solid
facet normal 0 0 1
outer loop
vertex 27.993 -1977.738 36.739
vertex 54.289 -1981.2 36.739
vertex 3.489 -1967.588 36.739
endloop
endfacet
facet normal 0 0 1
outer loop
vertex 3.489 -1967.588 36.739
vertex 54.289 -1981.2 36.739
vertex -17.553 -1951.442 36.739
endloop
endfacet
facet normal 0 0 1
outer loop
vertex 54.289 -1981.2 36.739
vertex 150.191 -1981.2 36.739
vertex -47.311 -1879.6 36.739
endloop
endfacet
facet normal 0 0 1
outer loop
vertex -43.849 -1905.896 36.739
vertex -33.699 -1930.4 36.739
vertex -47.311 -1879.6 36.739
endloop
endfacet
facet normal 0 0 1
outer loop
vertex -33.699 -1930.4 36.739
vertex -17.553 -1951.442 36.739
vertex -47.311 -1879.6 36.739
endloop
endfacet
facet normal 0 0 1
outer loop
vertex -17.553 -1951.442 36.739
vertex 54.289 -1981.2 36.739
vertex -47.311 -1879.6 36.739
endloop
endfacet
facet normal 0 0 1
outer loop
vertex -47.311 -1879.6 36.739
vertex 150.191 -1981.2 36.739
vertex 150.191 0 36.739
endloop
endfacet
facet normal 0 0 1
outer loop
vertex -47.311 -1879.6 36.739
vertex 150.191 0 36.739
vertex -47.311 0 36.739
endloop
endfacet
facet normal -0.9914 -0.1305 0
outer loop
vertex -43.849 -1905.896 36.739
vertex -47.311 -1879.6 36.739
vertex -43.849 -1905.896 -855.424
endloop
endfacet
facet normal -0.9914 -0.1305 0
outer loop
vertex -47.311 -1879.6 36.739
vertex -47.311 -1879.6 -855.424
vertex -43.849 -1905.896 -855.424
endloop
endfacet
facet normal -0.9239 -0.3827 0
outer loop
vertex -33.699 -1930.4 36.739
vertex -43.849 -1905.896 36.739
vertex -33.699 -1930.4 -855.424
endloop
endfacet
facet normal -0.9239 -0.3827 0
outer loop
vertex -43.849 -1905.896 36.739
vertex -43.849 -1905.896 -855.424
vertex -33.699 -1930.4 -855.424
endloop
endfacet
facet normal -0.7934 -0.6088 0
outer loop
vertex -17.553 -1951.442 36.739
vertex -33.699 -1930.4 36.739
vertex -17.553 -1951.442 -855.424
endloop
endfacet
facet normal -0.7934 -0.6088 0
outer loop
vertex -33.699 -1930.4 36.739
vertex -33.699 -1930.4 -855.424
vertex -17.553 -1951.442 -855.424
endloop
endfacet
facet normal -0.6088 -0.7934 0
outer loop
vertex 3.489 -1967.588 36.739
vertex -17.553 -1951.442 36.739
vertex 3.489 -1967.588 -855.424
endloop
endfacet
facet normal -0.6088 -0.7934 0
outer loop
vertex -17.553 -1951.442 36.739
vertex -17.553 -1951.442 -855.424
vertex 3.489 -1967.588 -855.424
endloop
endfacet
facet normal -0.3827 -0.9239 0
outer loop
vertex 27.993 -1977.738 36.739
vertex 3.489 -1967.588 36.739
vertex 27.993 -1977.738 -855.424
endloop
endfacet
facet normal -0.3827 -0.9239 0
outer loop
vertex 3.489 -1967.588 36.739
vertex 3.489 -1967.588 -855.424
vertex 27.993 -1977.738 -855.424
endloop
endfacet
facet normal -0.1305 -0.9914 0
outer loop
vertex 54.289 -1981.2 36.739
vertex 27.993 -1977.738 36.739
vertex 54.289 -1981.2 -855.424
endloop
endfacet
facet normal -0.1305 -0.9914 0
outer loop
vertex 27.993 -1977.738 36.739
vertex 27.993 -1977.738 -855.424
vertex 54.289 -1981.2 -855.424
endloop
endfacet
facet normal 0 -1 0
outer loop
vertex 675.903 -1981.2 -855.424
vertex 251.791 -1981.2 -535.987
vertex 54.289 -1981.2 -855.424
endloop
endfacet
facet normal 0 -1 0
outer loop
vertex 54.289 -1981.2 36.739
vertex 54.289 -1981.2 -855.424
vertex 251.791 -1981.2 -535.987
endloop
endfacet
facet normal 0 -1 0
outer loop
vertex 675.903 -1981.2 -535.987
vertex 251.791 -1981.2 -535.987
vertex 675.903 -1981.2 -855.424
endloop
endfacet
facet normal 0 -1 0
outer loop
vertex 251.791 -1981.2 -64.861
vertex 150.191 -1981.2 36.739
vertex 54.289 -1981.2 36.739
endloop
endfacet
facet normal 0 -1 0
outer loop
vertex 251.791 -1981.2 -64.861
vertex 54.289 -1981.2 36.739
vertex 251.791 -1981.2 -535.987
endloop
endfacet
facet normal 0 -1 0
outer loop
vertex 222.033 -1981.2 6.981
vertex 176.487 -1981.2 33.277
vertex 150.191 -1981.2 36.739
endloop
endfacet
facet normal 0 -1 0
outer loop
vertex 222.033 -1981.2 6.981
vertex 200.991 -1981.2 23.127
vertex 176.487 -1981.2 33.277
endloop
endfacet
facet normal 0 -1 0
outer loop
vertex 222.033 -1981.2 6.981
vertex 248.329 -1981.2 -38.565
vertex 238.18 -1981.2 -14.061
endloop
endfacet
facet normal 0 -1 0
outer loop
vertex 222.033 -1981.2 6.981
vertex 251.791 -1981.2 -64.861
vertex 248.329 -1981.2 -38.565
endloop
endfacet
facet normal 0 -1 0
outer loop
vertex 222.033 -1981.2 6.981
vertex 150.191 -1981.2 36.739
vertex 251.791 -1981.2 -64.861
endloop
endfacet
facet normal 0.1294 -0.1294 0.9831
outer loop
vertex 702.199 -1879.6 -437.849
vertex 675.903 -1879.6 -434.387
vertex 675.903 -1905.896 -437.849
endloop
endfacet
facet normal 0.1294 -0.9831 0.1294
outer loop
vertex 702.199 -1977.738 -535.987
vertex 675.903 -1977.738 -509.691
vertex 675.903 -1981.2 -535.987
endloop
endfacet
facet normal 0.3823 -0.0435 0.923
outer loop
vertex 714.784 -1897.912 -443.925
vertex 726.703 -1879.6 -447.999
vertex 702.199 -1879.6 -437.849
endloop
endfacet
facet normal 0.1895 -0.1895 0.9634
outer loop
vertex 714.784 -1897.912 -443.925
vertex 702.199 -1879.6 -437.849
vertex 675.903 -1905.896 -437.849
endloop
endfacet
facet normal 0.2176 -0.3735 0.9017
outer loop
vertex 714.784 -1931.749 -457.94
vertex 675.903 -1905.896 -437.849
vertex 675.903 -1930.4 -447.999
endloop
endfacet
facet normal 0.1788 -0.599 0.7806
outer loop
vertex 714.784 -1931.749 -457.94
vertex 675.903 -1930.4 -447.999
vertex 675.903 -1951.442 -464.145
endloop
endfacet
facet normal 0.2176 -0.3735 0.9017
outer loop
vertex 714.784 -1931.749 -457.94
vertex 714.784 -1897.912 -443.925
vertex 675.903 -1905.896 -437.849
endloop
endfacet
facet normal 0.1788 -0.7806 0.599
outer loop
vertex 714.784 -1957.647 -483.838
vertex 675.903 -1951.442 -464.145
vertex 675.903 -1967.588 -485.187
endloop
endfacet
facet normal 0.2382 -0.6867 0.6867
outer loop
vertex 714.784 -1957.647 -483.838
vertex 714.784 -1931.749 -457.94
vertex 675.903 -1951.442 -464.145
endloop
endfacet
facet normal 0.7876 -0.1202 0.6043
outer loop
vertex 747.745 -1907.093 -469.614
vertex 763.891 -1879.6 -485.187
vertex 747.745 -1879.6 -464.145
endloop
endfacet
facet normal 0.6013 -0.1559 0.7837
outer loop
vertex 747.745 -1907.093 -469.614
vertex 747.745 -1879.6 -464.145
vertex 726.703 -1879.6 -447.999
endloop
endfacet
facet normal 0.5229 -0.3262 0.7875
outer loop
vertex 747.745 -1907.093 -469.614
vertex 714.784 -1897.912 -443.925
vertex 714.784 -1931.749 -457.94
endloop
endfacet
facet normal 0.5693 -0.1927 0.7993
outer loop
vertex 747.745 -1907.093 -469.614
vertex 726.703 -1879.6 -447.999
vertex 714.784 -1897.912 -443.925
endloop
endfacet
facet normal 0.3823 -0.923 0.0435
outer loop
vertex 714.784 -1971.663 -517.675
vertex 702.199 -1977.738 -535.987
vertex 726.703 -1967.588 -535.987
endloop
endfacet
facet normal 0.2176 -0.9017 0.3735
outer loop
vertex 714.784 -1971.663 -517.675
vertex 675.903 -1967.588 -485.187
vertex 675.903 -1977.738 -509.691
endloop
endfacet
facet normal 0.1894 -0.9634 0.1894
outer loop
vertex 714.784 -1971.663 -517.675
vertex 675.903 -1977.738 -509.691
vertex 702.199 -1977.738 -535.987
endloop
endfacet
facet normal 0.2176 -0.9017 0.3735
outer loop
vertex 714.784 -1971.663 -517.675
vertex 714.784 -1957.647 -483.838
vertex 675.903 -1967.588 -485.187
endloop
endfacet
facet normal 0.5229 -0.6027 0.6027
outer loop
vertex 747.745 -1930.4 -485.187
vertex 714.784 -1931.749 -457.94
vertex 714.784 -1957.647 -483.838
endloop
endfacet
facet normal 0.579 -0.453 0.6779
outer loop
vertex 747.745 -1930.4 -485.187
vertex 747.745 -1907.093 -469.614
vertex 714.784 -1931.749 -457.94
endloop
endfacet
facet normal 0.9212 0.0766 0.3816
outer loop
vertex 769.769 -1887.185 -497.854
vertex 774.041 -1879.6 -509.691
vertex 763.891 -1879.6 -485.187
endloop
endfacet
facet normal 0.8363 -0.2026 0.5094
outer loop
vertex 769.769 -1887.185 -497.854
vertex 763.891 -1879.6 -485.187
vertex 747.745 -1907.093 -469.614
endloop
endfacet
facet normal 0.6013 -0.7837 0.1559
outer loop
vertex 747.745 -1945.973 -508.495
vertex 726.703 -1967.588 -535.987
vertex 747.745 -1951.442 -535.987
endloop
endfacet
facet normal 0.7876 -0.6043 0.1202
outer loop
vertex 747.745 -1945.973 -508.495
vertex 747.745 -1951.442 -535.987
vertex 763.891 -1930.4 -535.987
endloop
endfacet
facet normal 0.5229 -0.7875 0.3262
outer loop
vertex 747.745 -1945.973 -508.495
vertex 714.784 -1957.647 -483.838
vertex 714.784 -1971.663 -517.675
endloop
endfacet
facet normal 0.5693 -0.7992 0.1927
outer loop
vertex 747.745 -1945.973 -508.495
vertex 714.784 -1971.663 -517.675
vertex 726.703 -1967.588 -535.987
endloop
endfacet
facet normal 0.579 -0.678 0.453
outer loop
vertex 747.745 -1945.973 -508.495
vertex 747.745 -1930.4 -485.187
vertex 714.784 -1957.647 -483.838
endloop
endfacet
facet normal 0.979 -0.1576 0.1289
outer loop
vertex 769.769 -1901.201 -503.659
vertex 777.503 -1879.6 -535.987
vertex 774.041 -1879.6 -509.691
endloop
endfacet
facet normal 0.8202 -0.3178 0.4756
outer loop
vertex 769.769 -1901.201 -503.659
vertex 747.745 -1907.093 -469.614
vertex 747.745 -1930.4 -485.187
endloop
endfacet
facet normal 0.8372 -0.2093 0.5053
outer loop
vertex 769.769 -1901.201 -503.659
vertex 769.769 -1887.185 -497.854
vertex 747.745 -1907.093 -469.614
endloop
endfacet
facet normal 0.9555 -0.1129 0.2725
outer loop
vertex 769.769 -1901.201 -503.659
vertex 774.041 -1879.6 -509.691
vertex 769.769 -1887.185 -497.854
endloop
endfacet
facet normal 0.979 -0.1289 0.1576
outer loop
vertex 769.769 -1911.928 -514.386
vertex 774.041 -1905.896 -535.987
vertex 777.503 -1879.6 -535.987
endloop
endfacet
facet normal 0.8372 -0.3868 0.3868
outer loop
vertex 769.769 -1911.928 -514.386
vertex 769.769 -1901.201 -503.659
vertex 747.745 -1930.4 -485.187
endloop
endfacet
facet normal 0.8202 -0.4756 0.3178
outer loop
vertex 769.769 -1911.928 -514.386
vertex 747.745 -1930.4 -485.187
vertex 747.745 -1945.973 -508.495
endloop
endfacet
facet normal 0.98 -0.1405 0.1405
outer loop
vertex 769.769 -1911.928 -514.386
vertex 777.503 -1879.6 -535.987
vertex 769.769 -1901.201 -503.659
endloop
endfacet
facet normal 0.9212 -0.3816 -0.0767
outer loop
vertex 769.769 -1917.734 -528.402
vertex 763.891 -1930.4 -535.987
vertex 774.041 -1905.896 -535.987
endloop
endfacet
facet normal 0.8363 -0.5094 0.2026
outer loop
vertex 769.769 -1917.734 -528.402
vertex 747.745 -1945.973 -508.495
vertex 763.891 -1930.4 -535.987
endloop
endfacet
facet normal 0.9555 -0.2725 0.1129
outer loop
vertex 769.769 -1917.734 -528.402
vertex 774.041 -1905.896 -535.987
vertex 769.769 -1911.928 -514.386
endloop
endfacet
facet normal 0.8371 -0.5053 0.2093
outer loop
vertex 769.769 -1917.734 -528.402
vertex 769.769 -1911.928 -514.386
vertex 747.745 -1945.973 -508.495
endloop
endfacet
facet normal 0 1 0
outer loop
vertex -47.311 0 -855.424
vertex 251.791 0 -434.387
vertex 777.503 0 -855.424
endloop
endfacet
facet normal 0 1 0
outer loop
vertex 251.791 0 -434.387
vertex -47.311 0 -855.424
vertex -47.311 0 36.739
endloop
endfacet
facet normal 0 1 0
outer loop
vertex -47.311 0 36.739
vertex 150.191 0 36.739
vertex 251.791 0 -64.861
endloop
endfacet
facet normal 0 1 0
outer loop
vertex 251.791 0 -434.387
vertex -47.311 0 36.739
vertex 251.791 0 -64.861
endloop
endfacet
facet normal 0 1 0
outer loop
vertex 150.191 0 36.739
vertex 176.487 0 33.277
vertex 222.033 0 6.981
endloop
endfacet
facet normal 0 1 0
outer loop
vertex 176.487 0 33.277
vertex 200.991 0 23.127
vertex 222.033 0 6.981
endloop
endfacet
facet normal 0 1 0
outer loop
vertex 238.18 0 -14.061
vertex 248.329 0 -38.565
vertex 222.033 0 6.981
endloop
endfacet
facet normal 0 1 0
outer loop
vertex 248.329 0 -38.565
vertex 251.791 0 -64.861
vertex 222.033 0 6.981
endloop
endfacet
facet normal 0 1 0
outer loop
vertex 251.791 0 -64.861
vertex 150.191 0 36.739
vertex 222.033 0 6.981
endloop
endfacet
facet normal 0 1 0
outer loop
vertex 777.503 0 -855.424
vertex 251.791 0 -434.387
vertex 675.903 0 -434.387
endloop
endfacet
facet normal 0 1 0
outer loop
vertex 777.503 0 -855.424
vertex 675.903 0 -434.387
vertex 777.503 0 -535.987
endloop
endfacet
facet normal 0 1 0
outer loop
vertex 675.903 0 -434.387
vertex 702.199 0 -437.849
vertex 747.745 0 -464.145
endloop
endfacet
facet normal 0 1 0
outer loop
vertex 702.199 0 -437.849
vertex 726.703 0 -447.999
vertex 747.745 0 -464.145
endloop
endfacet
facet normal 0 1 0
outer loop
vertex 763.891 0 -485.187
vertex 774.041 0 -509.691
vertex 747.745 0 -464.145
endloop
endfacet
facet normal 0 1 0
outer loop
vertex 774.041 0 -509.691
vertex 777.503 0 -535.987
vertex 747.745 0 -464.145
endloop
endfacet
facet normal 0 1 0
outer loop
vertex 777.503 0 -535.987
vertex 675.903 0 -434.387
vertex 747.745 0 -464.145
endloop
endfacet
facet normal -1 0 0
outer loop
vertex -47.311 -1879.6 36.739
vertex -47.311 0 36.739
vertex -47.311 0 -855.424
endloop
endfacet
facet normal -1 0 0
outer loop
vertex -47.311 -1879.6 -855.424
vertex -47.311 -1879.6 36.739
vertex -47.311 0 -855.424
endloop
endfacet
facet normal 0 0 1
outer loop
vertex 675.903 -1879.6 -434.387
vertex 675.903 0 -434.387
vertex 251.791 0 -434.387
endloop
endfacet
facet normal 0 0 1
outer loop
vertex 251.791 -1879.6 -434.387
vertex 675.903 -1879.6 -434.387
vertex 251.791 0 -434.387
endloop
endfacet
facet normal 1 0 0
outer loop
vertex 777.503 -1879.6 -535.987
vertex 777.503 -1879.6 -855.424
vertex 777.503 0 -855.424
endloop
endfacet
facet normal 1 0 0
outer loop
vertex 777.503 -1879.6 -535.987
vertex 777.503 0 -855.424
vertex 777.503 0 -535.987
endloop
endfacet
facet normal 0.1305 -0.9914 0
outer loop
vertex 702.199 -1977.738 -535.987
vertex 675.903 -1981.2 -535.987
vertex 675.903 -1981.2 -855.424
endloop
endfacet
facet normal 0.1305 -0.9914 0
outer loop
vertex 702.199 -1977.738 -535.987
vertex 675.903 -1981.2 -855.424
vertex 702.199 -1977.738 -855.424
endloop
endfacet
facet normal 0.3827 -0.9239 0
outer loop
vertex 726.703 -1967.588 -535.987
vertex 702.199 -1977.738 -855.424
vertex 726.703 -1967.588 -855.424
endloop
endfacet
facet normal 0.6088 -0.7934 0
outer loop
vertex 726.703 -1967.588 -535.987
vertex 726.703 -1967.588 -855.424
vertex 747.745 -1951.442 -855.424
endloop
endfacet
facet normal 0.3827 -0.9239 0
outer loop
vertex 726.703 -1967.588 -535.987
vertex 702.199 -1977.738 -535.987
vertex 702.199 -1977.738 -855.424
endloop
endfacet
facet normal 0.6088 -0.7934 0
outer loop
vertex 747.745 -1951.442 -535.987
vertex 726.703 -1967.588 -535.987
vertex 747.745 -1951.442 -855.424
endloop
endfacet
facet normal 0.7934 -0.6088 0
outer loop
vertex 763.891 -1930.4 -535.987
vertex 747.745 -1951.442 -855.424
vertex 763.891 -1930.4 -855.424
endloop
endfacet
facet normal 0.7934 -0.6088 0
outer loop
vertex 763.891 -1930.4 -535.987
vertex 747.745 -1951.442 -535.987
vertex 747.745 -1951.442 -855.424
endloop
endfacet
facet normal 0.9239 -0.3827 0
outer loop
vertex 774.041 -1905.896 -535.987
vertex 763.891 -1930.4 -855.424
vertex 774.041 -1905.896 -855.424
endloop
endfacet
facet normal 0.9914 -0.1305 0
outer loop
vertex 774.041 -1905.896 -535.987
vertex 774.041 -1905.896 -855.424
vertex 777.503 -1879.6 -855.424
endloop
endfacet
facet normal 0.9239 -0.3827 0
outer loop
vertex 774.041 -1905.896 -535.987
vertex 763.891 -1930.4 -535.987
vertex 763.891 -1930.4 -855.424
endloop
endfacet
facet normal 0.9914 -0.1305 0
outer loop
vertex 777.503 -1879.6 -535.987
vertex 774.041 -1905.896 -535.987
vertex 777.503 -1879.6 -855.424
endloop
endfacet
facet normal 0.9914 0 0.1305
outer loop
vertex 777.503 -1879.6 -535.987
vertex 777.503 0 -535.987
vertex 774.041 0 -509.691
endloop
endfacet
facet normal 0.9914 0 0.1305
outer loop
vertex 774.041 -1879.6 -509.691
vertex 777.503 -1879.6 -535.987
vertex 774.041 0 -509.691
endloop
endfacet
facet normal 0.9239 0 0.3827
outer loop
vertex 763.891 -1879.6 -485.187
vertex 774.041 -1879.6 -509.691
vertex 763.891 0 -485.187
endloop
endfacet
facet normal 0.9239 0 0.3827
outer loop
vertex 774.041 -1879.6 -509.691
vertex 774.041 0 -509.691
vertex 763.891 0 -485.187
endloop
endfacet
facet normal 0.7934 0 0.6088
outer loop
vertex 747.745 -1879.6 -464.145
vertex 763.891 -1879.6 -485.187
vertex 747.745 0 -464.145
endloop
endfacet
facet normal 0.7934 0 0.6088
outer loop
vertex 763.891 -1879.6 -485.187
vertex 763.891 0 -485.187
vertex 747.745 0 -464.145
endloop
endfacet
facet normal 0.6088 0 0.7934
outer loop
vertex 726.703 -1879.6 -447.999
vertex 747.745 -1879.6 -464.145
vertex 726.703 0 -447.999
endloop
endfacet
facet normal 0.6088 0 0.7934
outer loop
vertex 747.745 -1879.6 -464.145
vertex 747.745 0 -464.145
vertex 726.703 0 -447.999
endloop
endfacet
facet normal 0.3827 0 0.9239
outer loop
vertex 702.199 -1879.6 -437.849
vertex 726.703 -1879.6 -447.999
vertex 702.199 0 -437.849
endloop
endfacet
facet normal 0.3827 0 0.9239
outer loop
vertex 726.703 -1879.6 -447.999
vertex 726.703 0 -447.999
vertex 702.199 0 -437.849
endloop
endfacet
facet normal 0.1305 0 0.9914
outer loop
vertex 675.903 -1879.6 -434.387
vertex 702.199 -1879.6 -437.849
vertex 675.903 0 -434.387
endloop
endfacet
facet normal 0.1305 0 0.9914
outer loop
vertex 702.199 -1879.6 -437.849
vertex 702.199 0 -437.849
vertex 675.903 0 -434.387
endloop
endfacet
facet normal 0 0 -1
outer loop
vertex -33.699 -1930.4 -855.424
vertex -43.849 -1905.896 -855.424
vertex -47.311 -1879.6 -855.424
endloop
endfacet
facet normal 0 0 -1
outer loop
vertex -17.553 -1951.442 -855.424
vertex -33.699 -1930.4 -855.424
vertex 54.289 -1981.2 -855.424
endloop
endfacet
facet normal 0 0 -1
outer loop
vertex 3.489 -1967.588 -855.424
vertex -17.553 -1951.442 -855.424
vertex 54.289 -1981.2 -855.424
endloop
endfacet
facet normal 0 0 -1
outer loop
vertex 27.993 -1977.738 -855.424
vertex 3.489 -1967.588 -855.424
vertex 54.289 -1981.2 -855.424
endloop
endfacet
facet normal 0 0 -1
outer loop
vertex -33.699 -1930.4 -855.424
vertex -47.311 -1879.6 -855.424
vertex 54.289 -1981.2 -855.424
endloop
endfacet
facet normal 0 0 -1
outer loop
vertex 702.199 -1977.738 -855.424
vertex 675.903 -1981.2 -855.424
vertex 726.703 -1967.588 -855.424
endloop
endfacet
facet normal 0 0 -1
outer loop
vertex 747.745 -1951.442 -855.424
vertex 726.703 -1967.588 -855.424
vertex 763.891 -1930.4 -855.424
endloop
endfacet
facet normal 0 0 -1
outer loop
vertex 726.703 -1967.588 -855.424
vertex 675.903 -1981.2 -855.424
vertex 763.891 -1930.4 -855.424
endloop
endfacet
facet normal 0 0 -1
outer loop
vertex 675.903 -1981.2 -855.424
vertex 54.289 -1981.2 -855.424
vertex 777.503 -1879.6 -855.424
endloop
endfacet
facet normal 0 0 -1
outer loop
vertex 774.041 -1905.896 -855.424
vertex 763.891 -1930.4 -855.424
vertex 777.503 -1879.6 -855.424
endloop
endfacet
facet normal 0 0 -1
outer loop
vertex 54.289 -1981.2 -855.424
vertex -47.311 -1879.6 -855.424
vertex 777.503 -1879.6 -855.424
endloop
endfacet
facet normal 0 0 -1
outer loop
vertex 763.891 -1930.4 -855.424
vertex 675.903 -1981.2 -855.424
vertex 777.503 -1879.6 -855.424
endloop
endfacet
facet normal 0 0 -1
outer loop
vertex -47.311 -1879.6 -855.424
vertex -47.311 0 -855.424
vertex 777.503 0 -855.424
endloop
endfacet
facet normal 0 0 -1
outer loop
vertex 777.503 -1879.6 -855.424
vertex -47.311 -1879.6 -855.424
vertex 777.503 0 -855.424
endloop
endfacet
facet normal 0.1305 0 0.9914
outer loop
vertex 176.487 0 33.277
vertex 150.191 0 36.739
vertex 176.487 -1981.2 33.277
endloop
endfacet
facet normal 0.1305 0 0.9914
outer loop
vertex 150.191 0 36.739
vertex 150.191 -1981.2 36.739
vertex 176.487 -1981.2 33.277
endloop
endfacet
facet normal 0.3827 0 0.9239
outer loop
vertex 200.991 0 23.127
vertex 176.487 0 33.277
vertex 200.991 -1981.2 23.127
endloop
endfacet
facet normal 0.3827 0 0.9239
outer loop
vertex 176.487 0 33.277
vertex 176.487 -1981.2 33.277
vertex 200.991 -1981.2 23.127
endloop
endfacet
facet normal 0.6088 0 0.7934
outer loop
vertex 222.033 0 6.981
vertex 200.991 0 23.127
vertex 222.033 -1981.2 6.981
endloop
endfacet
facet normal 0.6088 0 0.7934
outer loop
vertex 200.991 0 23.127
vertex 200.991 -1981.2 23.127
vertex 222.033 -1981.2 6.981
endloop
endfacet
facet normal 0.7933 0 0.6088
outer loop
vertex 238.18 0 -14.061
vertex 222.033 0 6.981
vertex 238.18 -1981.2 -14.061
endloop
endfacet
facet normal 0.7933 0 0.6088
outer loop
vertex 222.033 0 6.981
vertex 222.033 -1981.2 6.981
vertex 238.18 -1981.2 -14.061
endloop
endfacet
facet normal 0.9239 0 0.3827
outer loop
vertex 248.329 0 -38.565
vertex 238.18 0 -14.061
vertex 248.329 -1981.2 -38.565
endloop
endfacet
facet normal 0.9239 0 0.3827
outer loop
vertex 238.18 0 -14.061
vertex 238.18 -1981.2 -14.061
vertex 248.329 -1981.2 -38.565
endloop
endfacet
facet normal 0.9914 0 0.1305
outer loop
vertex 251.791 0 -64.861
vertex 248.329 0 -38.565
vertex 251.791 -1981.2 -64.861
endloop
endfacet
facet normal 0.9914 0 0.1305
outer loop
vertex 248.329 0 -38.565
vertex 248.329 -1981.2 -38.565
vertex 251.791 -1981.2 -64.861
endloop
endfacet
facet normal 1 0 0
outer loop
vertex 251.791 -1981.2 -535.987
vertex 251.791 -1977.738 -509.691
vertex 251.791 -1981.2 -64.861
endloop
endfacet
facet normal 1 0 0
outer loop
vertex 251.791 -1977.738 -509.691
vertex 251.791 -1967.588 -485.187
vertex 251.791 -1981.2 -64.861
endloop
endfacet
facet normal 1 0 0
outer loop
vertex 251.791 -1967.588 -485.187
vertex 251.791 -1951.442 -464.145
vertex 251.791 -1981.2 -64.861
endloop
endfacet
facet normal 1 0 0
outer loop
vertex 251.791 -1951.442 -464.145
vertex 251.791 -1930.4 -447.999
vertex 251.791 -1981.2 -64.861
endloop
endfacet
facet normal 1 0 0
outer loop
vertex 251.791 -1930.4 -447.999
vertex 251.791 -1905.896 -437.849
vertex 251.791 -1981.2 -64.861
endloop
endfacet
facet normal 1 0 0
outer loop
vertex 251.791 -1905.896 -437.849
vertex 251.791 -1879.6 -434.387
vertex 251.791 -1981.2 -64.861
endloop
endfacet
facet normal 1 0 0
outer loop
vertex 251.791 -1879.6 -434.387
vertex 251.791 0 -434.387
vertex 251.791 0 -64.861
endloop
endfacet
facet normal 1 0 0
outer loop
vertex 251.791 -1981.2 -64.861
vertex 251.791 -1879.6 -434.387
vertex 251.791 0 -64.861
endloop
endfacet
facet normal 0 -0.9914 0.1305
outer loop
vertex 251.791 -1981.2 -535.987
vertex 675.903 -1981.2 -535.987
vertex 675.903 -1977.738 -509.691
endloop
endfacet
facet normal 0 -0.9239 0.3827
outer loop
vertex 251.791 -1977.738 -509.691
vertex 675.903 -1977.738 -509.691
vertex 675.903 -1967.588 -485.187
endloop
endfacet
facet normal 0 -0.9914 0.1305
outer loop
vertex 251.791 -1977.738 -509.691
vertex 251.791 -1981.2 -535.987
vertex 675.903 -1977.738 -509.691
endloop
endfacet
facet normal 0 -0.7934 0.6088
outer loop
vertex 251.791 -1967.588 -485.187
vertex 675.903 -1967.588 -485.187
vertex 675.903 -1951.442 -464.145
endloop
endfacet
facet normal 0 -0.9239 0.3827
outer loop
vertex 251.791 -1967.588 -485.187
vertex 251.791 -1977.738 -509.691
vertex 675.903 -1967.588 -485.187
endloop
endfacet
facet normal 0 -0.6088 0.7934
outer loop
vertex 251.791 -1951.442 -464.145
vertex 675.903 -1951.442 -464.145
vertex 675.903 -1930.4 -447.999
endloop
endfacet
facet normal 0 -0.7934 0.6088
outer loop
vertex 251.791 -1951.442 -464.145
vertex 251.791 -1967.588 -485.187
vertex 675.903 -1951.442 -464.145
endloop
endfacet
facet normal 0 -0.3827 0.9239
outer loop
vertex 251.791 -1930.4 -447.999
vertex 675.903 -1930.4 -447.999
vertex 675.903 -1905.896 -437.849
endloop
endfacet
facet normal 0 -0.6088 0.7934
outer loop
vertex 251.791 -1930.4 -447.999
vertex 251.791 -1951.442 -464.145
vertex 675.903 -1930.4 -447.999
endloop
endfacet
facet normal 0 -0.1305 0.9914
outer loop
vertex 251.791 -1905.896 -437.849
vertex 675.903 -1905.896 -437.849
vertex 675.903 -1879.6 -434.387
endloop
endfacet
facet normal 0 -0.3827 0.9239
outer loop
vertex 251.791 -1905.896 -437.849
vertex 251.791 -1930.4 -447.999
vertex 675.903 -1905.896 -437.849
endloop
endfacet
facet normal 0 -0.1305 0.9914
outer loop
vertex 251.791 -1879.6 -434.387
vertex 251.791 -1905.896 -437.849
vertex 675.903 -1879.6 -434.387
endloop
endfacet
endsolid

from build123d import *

# Parameters (mm, degrees)
F1_DEPTH    = 1981.2
F2_R        = 101.6
F3_R        = 101.6
F4_T1_DEPTH = 2133.6
F4_S5_W     = 101.6
F4_S5_H     = 101.6
F4_T6_DEPTH = 101.6


# Not quite as in the source:
# - a fillet or chamfer that OpenCascade refuses, or shapes differently, is made with other operations: its cross-section is extruded or revolved along the edge and cut away or added


with BuildPart() as f1:
    # F0 (on Front) → F1 (new body)
    with BuildSketch(Plane.XZ):
        Polygon((251.7913877964, 36.7387868464), (-47.3107099533, 36.7387868464), (-47.3107099533, -855.4236292839), (777.5030732155, -855.4236292839), (777.5030732155, -434.3872666359), (251.7913877964, -434.3872666359), align=None)
    extrude(amount=F1_DEPTH)

    # F2
    f2_edges = [f1.edges().sort_by_distance(p)[0] for p in [
        (251.791388, -990.6, 36.738787),
        (-47.31071, -1981.2, -409.342421),
    ]]
    fillet(f2_edges, radius=F2_R)

    # F3
    f3_edges = [f1.edges().sort_by_distance(p)[0] for p in [
        (514.647231, -1981.2, -434.387267),
        (777.503073, -1981.2, -644.905448),
    ]]
    fillet(f3_edges, radius=F3_R)

    # F4: fillet of radius 101.6 on 1 edges, made by hand

    # F4_s2 → F4_t1 (cut)
    with BuildSketch(Plane.XZ.offset(-254)):
        with BuildLine():
            ThreePointArc((777.5030732155, -535.9872666359), (747.745122184, -464.1452176673), (675.9030732155, -434.3872666359))
            Line((675.9030732155, -434.3872666359), (777.5030732155, -434.3872666359))
            Line((777.5030732155, -434.3872666359), (777.5030732155, -535.9872666359))
        make_face()
    extrude(amount=F4_T1_DEPTH, mode=Mode.SUBTRACT)


with BuildPart() as f4_tool4:
    # F4_s5 → F4_t6 (new body)
    with BuildSketch(Plane.YZ.offset(675.9030732155)):
        with Locations((-1930.4, -485.1872666359)):
            Rectangle(F4_S5_W, F4_S5_H)
    extrude(amount=F4_T6_DEPTH)

    # F4_s7 → F4_t8 (revolve, cut)
    with BuildSketch(Plane(origin=(675.9030732155, -1879.6, -535.9872666359), x_dir=(0, 0.7071067812, -0.7071067812), z_dir=(0, -0.7071067812, -0.7071067812))):
        with BuildLine():
            ThreePointArc((0, -101.6), (101.6, 0), (0, 101.6))
            Line((0, 101.6), (0, -101.6))
        make_face()
    revolve(axis=Axis((675.9030732155, -1879.6, -535.9872666359), (1, 0, 0)), mode=Mode.SUBTRACT)


with BuildPart() as f1_1:
    add(f1.part)

    # F4_t3: cut F4_tool4
    add(f4_tool4.part, mode=Mode.SUBTRACT)


solid = f1_1.part
